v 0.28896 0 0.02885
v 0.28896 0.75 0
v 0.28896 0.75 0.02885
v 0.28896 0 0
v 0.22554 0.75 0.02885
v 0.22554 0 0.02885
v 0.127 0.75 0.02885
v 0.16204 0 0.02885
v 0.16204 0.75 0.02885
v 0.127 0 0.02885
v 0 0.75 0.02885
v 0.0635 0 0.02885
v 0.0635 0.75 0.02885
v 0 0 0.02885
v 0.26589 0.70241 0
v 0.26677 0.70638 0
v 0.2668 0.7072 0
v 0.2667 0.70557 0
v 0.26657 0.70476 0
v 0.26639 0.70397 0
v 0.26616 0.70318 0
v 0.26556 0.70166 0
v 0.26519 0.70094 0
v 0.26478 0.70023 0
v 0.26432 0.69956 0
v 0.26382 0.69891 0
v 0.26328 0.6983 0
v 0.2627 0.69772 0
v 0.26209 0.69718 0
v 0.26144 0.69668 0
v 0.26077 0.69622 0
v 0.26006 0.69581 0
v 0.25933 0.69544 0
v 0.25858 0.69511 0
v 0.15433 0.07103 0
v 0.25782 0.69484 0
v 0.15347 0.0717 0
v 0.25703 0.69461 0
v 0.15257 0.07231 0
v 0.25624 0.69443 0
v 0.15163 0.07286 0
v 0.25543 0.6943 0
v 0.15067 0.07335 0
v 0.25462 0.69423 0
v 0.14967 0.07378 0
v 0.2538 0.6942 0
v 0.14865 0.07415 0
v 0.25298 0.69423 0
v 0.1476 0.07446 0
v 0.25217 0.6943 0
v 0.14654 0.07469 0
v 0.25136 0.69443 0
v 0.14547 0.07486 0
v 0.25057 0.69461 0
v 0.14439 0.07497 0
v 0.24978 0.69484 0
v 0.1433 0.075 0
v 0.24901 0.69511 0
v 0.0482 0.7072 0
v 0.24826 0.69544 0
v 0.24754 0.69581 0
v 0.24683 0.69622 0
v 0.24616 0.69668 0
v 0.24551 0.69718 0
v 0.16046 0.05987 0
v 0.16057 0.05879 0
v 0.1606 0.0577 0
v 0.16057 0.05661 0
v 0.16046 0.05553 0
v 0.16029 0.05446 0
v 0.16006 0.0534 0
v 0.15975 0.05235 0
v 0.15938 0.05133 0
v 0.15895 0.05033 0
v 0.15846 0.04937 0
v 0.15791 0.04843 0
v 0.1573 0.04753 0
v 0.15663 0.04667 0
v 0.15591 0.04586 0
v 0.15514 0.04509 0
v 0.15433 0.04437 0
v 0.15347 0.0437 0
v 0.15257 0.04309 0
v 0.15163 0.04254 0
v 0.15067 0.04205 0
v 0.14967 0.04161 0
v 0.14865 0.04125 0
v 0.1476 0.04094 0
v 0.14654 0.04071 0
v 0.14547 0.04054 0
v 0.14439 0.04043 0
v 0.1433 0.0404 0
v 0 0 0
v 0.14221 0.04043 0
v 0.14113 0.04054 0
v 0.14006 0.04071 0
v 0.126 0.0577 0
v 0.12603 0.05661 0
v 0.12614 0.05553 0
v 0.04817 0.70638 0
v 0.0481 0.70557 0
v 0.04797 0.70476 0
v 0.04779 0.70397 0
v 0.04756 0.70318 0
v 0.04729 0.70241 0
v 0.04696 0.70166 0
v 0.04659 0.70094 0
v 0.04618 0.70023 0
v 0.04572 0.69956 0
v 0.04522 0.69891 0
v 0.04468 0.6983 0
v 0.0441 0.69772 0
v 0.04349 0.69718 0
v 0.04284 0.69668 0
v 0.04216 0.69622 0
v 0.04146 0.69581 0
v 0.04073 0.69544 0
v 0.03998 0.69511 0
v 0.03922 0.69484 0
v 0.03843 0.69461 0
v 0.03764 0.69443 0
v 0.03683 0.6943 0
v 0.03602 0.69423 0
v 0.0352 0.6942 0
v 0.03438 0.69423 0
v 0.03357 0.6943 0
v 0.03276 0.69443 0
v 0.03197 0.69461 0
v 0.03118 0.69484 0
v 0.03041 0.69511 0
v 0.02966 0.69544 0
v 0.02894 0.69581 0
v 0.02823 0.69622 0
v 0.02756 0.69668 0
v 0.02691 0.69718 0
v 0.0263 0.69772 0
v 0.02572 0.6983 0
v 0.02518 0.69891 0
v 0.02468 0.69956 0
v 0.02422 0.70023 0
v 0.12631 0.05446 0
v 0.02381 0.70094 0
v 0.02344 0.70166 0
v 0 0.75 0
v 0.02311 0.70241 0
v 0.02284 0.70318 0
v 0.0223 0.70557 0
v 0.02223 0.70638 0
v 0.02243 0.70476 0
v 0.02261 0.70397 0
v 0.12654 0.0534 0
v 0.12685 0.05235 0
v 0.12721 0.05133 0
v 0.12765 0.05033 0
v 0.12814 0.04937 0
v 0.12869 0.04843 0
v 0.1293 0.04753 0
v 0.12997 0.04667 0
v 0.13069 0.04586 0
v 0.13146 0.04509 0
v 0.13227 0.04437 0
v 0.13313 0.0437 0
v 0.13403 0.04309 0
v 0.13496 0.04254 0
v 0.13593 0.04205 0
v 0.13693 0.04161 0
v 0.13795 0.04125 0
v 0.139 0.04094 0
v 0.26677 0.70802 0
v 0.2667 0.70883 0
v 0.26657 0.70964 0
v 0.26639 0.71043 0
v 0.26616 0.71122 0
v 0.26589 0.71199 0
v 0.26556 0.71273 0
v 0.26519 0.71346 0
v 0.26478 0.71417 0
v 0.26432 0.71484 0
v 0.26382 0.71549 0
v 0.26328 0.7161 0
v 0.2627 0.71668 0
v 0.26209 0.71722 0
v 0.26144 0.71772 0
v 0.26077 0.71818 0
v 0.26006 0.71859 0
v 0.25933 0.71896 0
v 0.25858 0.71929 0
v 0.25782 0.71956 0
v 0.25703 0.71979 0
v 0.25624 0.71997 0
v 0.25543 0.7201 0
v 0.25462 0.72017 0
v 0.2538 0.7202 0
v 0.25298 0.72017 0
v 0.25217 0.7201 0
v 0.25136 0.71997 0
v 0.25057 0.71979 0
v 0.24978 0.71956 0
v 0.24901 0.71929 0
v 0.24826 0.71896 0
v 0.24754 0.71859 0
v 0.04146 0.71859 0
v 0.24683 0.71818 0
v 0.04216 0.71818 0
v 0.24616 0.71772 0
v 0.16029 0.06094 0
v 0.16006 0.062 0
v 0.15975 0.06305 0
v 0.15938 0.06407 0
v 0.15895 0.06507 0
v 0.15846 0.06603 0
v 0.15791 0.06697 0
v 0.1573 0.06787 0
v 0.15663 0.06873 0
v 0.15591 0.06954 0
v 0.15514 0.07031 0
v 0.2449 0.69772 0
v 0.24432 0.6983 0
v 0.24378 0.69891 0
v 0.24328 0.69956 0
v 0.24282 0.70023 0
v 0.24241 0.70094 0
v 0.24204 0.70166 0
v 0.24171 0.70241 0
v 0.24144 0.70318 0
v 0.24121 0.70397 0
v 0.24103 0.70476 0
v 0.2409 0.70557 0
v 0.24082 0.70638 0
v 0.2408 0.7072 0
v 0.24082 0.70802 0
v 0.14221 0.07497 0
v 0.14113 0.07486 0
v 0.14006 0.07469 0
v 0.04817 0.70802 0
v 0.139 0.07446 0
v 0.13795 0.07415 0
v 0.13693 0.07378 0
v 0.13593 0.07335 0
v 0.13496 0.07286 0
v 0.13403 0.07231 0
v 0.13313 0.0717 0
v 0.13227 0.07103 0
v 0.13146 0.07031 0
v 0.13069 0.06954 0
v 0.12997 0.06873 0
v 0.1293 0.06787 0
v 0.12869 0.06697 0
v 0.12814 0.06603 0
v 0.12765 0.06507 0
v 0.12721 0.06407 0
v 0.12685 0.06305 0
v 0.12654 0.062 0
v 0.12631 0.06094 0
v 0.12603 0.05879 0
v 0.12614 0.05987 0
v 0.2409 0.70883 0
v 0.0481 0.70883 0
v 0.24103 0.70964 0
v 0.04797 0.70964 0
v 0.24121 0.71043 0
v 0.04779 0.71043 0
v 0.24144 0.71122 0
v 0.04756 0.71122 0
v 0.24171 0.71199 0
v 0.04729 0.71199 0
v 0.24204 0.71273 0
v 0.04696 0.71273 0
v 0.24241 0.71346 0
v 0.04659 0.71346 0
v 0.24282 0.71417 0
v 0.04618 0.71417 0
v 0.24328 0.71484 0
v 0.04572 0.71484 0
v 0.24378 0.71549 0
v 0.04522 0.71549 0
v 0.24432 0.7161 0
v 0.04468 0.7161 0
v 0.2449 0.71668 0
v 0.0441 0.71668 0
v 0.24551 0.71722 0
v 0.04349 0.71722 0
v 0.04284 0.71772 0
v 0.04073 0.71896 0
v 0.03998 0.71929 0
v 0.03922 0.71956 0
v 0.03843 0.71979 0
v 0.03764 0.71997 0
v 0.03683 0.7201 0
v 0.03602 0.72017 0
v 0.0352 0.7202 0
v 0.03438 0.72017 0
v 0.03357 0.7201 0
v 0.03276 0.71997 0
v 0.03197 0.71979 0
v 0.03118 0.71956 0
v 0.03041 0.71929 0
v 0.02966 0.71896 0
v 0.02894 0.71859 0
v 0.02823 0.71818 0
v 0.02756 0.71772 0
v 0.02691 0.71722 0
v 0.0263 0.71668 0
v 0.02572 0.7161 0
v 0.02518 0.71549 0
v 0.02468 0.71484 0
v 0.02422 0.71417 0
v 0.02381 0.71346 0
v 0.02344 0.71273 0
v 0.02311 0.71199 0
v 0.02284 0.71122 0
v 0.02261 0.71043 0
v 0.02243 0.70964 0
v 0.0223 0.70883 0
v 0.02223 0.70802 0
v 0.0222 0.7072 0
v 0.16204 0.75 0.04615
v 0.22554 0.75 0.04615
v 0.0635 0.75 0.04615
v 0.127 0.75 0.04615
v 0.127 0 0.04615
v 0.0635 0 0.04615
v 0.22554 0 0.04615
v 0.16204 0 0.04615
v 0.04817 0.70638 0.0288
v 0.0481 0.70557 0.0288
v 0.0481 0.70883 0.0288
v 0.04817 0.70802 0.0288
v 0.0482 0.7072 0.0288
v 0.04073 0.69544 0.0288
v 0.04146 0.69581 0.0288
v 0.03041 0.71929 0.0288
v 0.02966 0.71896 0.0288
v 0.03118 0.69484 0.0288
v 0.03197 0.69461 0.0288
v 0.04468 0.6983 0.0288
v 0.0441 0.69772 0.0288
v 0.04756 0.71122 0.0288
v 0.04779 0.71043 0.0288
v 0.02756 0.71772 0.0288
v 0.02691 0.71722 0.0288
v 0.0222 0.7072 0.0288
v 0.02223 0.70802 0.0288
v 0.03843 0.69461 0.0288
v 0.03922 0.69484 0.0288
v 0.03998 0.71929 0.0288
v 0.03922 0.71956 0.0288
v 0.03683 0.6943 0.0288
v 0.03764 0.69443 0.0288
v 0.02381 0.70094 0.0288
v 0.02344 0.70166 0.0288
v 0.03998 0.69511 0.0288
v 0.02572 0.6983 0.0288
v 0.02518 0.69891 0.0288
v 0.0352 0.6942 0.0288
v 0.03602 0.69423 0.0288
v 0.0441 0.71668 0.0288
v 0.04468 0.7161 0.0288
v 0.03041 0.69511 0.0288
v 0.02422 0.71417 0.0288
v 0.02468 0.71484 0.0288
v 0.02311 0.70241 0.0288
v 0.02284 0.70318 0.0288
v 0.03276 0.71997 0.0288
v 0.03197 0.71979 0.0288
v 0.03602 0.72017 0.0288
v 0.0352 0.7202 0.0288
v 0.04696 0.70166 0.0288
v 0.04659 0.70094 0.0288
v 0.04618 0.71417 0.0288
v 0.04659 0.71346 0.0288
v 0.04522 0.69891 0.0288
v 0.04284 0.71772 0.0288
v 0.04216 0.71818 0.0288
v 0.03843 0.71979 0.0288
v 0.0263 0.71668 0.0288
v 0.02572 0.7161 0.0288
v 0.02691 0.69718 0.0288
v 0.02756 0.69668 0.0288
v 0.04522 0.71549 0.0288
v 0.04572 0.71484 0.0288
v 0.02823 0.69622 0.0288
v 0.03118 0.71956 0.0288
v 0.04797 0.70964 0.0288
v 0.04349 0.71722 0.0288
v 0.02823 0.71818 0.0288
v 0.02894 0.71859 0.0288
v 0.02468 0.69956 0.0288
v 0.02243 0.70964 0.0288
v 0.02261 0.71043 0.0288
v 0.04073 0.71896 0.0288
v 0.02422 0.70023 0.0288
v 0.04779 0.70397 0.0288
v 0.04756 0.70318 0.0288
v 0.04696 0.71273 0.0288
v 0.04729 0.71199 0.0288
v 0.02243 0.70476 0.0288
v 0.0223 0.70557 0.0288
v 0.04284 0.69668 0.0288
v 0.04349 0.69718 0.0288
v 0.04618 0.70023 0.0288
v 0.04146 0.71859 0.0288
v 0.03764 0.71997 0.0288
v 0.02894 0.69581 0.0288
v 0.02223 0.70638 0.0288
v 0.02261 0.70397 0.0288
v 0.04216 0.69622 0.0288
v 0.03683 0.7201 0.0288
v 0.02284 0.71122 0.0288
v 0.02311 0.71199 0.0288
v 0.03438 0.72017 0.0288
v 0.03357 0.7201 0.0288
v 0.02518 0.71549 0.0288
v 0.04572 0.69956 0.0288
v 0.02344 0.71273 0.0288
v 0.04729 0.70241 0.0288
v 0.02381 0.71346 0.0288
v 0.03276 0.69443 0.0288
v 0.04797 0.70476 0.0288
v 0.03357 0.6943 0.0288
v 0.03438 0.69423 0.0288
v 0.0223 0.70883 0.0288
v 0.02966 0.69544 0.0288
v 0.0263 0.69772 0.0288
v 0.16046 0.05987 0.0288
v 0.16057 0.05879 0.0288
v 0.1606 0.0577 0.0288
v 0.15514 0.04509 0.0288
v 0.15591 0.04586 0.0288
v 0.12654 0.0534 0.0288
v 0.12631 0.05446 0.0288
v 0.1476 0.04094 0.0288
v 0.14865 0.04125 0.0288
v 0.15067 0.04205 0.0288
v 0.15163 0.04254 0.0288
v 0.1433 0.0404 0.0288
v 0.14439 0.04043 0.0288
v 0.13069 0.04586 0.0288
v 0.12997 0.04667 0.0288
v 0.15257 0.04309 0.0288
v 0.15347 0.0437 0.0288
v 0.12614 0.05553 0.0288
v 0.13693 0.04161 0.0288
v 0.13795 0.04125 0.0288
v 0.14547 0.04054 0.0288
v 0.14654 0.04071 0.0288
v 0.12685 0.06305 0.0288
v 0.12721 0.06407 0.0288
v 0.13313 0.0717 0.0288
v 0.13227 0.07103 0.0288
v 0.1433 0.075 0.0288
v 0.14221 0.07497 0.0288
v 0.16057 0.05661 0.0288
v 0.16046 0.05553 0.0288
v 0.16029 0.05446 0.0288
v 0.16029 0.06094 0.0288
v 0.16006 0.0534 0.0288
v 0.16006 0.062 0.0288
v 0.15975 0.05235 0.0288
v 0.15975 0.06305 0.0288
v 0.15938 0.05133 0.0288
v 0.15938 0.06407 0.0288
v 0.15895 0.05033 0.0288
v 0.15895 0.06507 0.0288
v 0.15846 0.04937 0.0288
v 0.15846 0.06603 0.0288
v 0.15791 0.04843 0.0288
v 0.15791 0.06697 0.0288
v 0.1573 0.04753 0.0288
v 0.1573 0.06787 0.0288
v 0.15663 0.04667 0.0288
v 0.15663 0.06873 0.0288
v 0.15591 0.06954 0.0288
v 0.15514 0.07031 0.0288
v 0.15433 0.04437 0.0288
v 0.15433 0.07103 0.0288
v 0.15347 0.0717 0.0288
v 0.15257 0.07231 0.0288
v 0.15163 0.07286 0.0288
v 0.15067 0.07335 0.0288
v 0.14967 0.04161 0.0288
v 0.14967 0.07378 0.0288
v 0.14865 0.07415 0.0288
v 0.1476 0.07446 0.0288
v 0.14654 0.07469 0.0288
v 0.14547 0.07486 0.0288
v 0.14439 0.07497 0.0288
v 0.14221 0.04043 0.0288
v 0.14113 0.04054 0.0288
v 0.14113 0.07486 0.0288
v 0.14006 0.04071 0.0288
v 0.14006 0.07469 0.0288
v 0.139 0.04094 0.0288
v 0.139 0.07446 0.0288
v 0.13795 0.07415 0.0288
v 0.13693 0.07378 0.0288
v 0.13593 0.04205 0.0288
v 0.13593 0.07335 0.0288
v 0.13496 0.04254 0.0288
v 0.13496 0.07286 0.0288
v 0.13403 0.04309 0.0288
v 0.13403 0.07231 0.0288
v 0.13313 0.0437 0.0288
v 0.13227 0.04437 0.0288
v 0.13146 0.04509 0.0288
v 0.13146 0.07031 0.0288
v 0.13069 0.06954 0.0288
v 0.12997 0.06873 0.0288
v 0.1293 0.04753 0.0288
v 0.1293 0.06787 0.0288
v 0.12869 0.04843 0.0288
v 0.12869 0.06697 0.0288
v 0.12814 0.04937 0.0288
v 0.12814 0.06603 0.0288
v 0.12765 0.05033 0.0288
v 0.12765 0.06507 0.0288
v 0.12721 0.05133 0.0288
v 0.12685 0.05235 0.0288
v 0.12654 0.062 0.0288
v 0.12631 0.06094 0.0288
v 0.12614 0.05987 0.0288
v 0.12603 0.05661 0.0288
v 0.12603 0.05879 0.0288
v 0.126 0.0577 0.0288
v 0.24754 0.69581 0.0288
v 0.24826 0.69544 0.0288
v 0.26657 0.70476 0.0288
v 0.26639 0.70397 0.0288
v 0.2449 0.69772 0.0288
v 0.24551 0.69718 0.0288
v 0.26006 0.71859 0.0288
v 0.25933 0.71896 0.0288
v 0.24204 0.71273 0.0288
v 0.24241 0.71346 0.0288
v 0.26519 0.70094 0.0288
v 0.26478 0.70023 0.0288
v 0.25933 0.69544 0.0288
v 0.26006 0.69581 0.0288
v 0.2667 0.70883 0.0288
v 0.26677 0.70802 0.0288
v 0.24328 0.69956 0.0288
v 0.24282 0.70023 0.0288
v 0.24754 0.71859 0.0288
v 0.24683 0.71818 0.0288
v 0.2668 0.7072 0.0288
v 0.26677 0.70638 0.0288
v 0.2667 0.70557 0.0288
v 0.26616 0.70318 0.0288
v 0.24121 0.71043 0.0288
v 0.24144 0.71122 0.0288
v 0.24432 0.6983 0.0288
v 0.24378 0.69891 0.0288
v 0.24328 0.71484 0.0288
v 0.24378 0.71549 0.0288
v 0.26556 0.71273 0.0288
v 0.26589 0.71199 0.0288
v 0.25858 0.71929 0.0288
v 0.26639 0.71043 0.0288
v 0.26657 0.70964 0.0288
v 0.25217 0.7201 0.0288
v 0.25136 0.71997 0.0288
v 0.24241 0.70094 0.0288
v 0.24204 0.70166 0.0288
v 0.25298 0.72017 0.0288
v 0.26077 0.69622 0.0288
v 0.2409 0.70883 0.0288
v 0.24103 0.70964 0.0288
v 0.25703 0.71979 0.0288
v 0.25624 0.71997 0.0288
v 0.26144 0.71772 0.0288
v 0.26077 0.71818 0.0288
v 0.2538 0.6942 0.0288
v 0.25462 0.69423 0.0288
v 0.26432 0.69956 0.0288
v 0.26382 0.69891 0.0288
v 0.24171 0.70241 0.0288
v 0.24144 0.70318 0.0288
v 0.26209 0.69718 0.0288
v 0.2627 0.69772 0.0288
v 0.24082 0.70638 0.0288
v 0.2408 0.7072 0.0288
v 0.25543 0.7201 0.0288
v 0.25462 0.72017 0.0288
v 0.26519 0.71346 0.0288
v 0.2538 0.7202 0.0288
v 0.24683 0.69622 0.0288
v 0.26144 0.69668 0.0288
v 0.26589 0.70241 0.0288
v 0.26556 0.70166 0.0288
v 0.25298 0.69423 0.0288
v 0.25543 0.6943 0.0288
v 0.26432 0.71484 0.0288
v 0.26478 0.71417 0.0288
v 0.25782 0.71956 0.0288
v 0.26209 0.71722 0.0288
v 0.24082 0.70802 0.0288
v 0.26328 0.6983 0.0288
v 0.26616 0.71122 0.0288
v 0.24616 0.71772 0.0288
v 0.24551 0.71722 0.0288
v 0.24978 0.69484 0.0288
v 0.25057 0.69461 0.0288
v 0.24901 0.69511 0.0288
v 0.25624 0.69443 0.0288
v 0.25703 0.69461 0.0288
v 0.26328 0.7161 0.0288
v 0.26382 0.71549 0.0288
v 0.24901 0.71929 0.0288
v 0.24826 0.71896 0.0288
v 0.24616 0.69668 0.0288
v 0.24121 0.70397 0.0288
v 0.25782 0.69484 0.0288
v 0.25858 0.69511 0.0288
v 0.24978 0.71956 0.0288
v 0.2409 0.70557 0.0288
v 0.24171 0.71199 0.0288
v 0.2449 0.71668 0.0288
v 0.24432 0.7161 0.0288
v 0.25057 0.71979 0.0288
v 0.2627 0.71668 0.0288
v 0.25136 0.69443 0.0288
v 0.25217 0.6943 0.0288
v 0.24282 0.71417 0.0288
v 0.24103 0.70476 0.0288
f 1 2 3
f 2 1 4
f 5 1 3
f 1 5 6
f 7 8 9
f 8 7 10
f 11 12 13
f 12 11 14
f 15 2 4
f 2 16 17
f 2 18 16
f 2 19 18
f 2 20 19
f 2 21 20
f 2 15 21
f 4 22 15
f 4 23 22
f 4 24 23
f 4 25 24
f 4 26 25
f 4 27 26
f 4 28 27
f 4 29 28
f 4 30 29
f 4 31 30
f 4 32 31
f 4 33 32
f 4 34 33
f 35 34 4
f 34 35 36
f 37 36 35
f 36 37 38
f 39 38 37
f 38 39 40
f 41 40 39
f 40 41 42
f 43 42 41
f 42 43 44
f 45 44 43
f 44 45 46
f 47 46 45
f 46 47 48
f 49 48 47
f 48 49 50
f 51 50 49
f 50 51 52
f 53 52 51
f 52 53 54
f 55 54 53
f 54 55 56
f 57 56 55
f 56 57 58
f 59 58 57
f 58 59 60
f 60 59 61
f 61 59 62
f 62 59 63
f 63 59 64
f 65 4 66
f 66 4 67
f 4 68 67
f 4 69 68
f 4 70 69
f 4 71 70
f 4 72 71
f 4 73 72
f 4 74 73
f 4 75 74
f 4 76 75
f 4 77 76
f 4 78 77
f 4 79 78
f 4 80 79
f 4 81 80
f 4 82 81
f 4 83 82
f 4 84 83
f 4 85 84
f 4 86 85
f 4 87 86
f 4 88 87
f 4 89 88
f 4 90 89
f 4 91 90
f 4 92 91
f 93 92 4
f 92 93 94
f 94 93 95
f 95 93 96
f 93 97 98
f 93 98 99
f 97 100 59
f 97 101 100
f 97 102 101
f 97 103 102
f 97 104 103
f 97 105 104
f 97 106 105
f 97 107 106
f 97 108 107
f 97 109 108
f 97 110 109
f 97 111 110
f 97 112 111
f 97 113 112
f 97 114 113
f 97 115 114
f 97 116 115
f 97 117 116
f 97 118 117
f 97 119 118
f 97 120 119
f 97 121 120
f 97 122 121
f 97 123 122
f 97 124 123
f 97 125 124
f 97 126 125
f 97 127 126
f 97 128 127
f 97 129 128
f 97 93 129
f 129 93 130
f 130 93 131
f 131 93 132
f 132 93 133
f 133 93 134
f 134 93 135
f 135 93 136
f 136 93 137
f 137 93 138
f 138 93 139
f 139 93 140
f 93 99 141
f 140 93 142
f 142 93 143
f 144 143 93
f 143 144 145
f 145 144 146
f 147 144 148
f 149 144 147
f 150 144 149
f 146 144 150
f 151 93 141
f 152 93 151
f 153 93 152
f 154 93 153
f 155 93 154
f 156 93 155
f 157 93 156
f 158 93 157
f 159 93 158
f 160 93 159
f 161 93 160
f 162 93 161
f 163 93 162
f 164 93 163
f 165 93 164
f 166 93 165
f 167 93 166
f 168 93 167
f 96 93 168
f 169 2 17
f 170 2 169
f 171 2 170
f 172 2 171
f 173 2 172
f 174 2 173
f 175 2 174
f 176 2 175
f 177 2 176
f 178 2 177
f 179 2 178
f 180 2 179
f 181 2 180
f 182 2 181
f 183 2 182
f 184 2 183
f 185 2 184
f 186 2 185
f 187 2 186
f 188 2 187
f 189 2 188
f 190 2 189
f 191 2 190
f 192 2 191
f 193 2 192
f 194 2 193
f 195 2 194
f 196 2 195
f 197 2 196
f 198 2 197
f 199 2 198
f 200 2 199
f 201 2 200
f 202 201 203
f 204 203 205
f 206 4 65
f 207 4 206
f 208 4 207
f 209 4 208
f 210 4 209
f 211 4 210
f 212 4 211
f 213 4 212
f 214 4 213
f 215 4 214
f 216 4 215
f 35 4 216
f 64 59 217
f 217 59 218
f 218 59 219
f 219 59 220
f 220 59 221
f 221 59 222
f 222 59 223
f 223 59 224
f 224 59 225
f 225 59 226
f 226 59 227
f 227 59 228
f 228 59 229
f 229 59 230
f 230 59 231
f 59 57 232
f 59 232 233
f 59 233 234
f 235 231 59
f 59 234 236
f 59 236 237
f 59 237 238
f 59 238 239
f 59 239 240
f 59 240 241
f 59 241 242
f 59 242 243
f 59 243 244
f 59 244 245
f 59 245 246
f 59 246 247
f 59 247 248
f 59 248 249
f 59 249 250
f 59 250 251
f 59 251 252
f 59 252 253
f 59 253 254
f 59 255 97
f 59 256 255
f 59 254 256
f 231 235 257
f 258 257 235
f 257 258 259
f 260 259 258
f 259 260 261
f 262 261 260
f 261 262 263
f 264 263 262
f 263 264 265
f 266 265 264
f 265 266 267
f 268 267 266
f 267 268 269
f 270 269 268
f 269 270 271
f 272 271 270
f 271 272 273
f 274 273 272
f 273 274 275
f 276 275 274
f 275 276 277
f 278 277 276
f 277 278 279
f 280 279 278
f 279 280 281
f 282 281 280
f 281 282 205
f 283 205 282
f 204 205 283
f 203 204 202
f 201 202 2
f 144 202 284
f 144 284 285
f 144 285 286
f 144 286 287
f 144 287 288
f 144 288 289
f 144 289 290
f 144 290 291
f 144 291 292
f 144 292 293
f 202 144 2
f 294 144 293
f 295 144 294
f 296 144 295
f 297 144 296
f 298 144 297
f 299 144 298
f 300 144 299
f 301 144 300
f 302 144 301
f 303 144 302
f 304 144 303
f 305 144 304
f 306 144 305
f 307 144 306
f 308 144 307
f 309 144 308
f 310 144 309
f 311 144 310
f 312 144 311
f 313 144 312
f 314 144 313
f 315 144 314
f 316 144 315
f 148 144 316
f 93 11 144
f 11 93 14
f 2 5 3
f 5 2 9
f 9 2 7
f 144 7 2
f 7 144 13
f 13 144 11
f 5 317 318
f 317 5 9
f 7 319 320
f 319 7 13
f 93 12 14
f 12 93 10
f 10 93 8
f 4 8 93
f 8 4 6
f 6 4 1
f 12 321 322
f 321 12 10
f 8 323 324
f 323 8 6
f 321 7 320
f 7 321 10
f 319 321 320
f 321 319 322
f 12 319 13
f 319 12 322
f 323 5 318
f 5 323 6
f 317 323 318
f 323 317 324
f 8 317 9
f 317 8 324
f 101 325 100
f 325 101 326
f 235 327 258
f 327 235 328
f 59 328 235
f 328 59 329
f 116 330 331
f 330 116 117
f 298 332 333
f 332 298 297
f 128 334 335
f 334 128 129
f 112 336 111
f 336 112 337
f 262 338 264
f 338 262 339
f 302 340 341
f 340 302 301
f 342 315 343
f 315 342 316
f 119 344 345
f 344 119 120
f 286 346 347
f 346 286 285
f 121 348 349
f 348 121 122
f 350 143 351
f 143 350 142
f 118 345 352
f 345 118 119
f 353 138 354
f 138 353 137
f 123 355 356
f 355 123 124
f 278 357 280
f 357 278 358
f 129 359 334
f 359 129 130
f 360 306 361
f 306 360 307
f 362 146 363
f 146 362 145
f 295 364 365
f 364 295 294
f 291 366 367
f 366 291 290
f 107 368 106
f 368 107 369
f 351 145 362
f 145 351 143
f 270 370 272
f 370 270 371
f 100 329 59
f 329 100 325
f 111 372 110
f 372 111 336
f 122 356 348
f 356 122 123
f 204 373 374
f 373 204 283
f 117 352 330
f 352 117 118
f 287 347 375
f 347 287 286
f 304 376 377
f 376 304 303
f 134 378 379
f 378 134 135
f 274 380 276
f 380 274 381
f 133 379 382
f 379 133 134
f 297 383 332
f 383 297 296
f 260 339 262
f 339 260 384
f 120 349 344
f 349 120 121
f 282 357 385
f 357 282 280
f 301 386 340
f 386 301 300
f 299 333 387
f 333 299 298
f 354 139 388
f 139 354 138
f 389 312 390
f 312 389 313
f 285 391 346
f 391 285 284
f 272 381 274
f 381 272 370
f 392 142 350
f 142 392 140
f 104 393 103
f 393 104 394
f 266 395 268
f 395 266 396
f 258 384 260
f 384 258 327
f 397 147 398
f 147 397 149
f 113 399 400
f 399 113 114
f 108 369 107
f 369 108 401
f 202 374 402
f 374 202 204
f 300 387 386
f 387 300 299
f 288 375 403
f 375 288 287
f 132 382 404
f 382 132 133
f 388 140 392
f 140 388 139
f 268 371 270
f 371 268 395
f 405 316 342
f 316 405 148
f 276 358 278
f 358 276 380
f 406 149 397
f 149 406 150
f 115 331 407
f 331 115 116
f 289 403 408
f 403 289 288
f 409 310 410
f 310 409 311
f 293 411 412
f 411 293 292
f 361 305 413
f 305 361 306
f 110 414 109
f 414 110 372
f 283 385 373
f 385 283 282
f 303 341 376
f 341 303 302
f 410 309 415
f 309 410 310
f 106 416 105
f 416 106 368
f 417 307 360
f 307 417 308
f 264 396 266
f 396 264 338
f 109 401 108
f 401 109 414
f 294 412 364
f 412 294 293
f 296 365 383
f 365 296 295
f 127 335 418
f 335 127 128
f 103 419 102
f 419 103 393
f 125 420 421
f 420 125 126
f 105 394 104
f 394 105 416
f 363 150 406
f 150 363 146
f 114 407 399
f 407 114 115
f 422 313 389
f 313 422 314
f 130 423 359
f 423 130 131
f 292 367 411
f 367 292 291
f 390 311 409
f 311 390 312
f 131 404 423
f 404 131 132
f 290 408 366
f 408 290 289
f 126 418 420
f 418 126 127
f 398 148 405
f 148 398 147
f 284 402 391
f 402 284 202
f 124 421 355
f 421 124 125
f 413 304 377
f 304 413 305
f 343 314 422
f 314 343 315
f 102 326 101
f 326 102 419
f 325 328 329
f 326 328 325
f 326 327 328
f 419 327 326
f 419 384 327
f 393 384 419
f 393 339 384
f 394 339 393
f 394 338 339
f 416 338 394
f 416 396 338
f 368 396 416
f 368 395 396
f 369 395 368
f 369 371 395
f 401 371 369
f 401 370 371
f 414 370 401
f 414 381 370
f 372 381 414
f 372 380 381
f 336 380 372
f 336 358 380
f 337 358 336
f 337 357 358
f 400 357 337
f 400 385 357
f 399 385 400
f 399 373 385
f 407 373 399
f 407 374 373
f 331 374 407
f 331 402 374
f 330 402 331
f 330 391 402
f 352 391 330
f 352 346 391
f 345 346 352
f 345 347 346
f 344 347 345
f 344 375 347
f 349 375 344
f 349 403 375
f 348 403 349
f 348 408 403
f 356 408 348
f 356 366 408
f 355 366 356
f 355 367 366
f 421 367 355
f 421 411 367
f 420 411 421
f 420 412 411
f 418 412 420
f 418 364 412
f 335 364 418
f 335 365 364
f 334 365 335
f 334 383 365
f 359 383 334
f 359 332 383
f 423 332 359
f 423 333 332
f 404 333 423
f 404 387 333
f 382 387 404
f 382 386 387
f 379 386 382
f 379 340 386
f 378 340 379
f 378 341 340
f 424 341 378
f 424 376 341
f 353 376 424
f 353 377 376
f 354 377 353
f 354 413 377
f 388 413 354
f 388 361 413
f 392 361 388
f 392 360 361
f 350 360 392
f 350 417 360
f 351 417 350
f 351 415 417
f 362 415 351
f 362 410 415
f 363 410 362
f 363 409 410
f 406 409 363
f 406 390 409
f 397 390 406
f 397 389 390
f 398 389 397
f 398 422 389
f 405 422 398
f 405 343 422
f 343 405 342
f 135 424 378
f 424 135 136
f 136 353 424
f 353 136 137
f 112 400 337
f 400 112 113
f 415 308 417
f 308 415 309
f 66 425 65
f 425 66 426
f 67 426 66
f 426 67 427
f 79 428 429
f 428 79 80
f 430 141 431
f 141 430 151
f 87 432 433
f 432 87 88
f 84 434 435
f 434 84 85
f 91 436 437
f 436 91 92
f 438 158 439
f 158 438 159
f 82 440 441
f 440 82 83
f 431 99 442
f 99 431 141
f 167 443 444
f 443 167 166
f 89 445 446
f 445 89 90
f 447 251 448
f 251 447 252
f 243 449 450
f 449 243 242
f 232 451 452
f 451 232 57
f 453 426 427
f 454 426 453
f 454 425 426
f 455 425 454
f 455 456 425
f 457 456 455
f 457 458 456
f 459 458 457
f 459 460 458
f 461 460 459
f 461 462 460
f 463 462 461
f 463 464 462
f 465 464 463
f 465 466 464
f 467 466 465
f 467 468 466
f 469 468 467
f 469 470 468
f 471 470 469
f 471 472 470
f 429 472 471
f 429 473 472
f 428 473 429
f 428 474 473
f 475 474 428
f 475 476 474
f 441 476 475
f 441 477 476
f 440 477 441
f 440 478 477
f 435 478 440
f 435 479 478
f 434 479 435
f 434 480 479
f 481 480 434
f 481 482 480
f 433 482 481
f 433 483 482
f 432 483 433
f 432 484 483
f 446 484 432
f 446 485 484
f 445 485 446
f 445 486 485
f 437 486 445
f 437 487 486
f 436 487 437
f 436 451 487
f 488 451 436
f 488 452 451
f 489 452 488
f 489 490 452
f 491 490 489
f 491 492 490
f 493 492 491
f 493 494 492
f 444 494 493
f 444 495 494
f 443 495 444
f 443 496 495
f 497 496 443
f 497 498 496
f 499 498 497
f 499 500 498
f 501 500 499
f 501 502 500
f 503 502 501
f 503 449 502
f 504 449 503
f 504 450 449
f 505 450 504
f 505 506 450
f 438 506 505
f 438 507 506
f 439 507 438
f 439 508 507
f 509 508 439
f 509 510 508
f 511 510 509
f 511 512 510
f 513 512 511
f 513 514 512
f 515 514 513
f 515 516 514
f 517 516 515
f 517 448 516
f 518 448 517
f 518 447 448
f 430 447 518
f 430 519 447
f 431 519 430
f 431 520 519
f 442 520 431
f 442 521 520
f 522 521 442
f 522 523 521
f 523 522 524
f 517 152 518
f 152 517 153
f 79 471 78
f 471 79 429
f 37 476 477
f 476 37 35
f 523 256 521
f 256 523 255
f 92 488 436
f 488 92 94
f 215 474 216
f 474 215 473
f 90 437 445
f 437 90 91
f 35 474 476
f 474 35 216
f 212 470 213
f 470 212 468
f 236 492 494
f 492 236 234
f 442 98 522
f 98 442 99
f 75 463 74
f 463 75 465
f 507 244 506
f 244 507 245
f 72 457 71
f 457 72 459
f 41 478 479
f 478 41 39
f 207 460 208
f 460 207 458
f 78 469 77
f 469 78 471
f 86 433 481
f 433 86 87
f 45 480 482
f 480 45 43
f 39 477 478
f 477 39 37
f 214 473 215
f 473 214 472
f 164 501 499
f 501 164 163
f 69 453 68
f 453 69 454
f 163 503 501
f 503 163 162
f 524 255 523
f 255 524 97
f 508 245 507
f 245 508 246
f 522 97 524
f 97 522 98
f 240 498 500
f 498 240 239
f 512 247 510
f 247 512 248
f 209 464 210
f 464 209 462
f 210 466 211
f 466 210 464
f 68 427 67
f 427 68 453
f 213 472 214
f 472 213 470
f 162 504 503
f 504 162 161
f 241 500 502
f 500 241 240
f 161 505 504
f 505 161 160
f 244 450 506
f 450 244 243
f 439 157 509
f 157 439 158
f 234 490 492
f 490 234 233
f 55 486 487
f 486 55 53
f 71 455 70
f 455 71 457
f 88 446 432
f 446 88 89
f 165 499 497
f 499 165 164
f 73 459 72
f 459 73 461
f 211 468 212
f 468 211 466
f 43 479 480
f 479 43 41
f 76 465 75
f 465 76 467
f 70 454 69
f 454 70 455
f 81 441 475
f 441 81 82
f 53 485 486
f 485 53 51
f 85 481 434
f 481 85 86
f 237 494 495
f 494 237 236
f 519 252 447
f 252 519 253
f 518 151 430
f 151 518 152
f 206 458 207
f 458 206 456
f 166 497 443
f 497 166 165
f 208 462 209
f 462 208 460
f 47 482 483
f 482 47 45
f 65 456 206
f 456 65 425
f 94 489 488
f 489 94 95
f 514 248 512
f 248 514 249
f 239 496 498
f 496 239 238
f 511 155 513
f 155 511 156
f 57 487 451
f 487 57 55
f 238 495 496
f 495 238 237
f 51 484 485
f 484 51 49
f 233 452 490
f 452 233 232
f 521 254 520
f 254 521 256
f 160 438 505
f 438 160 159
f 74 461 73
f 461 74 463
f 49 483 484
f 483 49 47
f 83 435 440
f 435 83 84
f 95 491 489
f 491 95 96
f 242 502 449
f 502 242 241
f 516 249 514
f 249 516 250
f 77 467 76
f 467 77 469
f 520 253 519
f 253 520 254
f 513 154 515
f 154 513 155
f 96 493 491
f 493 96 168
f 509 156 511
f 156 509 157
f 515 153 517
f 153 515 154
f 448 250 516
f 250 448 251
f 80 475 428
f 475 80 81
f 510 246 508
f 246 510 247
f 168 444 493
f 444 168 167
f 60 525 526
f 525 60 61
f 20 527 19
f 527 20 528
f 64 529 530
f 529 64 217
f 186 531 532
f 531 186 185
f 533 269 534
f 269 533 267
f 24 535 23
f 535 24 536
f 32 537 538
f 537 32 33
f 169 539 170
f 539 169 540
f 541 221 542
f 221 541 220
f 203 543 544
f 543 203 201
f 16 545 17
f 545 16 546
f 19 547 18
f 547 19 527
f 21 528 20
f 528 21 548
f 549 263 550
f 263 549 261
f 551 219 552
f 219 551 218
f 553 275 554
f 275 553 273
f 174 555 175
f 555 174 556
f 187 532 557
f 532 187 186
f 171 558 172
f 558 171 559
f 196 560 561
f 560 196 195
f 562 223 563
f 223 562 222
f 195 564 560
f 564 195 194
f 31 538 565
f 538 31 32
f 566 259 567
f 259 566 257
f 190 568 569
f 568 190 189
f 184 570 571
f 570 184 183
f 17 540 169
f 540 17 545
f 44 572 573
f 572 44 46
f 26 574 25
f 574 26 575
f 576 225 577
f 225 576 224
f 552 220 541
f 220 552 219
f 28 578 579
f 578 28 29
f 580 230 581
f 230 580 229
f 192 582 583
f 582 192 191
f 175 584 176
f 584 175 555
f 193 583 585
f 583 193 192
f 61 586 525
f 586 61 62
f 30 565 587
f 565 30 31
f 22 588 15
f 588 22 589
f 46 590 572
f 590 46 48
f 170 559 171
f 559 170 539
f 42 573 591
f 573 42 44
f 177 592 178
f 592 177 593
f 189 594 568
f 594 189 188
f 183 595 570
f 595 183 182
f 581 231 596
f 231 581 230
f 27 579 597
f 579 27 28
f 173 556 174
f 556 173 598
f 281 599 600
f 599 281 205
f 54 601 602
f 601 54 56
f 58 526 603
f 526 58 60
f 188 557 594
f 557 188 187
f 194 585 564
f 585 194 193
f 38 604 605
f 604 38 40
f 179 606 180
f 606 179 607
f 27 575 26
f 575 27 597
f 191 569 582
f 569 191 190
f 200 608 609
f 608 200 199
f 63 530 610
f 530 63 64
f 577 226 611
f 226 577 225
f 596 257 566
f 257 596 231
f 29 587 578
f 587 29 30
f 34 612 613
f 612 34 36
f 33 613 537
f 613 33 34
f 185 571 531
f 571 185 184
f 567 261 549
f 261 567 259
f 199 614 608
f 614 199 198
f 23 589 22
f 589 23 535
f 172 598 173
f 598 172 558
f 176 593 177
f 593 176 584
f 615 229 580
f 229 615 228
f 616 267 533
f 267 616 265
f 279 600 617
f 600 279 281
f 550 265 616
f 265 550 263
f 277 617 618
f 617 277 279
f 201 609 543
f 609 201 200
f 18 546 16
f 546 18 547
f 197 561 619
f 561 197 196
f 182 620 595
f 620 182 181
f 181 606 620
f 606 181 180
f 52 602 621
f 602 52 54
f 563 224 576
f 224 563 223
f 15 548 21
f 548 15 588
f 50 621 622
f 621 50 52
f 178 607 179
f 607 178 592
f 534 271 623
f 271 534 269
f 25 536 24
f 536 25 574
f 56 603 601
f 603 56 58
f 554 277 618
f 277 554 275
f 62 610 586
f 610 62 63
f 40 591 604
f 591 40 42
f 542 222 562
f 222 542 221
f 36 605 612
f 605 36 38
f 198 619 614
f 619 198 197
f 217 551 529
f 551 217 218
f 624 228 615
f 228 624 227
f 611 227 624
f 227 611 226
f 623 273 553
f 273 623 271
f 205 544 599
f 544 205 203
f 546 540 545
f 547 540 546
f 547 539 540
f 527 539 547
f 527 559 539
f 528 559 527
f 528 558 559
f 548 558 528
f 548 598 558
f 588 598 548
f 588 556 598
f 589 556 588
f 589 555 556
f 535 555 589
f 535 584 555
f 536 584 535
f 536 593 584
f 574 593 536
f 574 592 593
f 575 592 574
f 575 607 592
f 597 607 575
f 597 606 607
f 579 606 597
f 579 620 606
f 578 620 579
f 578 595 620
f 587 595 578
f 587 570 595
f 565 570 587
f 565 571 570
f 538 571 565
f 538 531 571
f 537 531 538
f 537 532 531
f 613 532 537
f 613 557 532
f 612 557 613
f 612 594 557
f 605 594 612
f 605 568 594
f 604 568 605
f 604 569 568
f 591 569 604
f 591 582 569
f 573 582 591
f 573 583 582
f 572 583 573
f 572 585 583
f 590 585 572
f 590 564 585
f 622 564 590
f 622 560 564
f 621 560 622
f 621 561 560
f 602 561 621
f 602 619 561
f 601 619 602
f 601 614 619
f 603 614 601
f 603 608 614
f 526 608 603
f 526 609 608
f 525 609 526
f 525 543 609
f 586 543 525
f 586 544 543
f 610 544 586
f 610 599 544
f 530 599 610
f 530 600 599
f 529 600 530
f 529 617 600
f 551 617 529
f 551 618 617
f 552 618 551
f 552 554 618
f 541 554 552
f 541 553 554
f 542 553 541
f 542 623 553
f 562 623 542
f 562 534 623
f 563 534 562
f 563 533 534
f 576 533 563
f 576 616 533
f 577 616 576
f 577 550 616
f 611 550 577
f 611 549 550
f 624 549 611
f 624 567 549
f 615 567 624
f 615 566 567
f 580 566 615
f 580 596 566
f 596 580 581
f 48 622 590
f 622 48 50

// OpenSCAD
// Parameters
base_length = 0.28896;
base_width = 0.75;
base_height = 0.028846;

rib_height = 0.017308;
rib_width = 0.0635;
rib_group_width = 0.162037;
rib_inset = 0.0635;

// Hole axes (offset from left / front edges)
h1_x = 0.0352;  h1_y = 0.7072;  h1_r = 0.013;
h2_x = 0.1433;  h2_y = 0.0577;  h2_r = 0.0173;
h3_x = 0.2538;  h3_y = 0.7072;  h3_r = 0.013;

// Stepped hole Z extents from base underside
upper_z0 = 0.0057;
upper_h  = 0.0231;
deep_z0  = -0.1154;
deep_h   = 0.1442;

$fn = 100;

module base_block() {
    cube([base_length, base_width, base_height]);
}

module single_rib(x) {
    translate([x, 0, base_height])
        cube([rib_width, base_width, rib_height]);
}

module stepped_hole(x, y, r) {
    translate([x, y, upper_z0])
        cylinder(h = upper_h, r = r);
    translate([x, y, deep_z0])
        cylinder(h = deep_h, r = r);
}

difference() {
    union() {
        base_block();
        single_rib(rib_inset);
        single_rib(rib_inset + rib_group_width - rib_width);
    }
    stepped_hole(h1_x, h1_y, h1_r);
    stepped_hole(h2_x, h2_y, h2_r);
    stepped_hole(h3_x, h3_y, h3_r);
}
